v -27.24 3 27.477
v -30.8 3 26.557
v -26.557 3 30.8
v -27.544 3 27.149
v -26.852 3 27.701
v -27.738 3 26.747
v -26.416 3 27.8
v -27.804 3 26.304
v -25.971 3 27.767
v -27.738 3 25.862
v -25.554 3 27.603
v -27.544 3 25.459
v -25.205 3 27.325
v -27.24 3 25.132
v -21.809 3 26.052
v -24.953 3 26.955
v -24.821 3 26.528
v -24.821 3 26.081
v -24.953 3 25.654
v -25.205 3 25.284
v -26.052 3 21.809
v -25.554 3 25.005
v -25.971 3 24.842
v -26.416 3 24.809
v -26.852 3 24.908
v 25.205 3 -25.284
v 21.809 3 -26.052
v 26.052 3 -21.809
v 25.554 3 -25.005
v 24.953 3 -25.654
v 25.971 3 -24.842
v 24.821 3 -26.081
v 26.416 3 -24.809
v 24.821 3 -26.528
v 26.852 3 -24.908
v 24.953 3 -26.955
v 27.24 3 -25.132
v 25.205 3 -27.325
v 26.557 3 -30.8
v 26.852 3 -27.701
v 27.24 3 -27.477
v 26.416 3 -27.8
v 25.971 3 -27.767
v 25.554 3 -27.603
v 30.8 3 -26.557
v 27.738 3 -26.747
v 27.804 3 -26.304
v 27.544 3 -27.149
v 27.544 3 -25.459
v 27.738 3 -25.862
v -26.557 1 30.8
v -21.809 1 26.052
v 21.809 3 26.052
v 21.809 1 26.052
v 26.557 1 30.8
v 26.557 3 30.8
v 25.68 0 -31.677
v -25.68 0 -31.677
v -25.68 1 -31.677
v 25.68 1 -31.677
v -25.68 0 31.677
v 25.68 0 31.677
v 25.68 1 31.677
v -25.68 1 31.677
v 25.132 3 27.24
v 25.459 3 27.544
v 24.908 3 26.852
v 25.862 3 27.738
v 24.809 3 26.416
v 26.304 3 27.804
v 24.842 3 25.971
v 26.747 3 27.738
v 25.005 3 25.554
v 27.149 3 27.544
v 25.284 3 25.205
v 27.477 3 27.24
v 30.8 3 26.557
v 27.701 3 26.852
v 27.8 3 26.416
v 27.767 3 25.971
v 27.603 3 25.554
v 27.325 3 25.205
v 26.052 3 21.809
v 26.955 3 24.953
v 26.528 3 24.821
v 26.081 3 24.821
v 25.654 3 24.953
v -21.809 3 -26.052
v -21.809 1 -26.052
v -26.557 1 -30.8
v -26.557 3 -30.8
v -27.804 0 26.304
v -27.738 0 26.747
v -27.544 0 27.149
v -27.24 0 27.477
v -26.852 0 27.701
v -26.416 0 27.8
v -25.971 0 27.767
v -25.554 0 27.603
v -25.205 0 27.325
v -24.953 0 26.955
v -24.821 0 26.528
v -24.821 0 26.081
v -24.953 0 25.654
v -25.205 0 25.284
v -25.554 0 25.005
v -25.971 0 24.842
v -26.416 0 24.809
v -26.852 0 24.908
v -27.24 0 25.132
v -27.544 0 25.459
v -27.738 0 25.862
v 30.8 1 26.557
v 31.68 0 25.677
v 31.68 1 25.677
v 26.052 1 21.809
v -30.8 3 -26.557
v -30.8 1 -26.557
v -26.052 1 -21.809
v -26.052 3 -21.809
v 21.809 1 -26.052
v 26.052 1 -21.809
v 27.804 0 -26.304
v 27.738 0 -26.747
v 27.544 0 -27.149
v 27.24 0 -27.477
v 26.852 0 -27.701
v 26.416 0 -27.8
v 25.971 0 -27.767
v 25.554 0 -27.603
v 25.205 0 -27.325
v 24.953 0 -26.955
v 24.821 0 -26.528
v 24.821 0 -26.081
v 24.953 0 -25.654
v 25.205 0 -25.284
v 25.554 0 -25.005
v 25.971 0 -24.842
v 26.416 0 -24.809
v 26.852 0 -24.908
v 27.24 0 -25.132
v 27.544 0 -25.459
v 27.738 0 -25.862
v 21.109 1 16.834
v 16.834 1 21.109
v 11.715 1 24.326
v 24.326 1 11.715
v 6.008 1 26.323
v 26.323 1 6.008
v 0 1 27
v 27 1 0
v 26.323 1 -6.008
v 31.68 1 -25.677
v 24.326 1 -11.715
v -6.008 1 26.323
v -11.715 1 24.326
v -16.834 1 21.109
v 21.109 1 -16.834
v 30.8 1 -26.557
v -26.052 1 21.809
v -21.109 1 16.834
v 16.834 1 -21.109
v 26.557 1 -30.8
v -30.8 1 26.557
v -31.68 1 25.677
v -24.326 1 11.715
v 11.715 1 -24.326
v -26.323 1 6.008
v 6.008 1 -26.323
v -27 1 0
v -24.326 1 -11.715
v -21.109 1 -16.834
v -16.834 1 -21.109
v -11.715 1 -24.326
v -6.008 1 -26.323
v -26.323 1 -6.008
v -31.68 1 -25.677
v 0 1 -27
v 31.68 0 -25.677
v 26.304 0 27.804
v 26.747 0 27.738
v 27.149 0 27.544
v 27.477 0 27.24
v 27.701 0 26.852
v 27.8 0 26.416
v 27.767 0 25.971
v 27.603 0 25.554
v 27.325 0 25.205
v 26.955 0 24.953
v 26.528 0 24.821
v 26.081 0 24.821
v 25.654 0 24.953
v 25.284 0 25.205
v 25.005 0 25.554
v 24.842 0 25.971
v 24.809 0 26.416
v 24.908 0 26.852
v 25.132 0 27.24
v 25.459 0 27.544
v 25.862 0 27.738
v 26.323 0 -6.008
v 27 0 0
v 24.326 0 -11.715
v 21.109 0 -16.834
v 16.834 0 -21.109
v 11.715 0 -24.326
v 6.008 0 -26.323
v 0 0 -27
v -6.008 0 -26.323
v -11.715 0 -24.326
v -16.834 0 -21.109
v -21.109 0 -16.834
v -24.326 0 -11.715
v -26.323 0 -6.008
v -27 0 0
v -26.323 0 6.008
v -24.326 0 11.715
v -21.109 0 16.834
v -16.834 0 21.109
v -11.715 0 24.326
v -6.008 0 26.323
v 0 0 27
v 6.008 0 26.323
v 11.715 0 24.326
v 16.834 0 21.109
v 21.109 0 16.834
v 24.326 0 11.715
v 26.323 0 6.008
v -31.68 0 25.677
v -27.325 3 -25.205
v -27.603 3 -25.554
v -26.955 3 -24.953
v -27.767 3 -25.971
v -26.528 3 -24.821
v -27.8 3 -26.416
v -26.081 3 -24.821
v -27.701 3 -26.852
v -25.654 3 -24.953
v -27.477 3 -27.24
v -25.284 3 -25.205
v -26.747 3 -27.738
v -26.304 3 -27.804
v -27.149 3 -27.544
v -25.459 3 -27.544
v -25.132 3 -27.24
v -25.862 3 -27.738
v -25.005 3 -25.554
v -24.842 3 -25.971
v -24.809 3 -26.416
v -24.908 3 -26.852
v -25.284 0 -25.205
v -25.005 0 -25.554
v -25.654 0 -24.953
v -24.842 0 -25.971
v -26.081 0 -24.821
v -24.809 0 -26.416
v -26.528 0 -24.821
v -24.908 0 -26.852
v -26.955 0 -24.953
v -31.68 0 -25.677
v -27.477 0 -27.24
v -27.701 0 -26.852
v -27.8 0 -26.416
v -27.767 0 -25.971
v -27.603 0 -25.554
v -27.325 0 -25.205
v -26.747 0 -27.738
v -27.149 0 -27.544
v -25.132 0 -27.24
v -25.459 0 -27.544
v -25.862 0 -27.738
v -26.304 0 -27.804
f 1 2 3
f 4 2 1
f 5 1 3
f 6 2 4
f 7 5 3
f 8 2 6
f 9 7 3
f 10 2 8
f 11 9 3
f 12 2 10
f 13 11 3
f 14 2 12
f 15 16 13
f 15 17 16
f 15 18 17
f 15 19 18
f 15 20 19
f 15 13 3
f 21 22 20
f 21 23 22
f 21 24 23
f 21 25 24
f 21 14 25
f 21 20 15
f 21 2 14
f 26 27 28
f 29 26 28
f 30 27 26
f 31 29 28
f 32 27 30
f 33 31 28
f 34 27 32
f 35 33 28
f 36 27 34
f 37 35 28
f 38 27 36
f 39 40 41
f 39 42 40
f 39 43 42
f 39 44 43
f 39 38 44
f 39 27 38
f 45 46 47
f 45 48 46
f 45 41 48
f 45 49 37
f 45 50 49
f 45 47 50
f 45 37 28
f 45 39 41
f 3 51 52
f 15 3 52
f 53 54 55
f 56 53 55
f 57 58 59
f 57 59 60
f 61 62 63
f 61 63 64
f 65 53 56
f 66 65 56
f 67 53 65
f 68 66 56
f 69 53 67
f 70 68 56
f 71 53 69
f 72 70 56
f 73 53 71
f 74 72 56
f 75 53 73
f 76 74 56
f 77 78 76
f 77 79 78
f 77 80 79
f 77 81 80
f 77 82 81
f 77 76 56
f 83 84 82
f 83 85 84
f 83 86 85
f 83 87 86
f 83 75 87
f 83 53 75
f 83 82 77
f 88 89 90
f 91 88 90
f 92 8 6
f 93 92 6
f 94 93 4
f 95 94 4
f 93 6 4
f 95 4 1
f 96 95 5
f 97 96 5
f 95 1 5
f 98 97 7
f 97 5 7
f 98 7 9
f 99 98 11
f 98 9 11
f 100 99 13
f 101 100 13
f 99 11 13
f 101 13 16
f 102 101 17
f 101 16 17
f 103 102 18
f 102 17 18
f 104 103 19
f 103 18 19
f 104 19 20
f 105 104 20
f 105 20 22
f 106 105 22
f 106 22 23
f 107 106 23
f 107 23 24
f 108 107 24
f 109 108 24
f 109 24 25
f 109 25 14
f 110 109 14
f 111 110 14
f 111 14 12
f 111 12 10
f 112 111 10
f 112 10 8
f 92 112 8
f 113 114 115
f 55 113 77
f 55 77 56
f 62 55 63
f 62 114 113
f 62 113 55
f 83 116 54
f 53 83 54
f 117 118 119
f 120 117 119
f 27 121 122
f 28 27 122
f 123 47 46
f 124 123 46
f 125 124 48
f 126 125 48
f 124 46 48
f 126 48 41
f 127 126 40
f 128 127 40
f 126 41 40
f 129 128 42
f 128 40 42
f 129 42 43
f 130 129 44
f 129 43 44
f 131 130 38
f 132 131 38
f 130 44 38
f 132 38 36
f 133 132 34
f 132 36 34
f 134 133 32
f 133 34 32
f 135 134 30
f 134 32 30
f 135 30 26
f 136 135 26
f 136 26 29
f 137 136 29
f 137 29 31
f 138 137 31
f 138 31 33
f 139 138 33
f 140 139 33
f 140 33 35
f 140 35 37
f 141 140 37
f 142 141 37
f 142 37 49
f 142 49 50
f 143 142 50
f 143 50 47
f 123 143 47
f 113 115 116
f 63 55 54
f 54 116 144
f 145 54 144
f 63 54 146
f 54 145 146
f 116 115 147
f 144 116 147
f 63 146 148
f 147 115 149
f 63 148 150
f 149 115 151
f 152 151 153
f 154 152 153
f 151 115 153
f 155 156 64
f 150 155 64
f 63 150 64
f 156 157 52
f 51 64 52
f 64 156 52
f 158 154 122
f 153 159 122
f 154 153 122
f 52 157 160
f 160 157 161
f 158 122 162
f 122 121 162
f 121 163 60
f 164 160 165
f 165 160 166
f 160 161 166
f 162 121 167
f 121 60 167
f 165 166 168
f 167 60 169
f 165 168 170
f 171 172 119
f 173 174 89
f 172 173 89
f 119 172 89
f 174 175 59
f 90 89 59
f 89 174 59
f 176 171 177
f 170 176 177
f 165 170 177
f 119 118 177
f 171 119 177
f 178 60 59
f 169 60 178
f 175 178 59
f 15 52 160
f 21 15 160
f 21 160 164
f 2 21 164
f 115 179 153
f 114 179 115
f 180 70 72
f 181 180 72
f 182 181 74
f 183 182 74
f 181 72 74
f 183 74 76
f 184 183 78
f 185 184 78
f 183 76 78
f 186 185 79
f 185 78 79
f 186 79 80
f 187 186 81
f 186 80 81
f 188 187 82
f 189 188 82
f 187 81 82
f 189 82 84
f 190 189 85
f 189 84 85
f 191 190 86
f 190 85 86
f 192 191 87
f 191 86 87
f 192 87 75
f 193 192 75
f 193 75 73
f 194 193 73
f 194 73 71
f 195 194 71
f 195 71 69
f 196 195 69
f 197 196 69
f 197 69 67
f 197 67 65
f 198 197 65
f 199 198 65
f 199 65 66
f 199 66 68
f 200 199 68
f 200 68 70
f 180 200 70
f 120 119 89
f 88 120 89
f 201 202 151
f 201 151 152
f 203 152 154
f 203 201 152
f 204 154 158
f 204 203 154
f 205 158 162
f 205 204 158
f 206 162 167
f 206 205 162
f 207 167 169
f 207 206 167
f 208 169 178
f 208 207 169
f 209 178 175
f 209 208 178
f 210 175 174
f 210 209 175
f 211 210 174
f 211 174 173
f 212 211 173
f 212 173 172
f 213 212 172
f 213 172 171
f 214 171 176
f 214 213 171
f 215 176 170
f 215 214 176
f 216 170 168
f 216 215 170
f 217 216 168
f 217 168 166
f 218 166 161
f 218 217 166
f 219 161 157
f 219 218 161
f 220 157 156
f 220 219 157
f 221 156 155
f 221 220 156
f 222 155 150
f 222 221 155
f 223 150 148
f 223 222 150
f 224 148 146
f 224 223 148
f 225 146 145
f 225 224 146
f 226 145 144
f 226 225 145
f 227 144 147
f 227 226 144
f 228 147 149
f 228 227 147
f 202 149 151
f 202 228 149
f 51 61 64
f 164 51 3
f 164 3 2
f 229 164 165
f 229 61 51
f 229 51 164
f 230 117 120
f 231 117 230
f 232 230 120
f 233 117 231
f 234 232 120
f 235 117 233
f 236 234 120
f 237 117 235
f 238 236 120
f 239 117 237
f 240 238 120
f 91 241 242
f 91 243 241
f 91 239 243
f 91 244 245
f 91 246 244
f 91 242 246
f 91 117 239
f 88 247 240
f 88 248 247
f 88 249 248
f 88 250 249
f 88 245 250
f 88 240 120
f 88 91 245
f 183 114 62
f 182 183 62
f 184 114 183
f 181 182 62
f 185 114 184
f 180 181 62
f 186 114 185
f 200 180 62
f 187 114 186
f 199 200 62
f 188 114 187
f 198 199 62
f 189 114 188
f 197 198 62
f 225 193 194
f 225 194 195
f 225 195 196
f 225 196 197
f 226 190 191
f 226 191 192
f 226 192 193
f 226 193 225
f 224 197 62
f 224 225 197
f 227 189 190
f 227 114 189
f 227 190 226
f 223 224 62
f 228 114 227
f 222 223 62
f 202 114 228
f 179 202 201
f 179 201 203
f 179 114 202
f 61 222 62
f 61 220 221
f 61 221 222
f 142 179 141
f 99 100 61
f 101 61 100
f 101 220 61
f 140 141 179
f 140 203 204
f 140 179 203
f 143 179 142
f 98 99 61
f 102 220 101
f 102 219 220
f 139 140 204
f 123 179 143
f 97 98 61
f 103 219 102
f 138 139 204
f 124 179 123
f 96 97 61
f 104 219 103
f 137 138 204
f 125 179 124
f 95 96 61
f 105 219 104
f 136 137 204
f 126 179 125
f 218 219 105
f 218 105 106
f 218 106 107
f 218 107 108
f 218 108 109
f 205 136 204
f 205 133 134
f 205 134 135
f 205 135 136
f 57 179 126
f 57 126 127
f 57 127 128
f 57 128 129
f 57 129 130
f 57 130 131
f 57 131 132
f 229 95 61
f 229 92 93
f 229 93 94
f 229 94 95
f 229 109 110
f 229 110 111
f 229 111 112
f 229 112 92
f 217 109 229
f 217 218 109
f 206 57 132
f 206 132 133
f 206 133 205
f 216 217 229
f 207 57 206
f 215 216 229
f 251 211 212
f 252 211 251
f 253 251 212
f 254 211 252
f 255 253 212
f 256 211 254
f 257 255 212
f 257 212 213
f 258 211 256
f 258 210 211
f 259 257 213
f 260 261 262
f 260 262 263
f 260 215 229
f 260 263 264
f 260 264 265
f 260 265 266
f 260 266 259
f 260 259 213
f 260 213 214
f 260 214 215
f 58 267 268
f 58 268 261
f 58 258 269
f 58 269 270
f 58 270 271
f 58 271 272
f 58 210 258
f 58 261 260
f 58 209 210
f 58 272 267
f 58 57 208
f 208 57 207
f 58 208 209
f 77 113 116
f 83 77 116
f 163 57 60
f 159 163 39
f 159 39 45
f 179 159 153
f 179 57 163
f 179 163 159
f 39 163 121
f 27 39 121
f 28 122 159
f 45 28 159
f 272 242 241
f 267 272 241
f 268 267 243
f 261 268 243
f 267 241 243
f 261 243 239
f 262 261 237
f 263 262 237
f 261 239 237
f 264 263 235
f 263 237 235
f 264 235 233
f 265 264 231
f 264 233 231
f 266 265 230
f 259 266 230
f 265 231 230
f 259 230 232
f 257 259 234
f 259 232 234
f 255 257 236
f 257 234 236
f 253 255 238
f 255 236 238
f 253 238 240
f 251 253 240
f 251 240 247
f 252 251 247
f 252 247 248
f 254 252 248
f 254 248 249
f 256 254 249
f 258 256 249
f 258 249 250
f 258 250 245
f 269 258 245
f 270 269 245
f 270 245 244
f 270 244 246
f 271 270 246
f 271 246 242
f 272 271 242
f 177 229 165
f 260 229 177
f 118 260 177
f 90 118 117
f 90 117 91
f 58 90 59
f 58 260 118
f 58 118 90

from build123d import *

# Parameters (mm, degrees)
SKETCH1_R           = 27
BOSS_EXTRUDE1_DEPTH = 1
BOSS_EXTRUDE3_DEPTH = 2
SKETCH14_R          = 1.5
CUT_EXTRUDE2_DEPTH  = 4
CIRPATTERN2_COUNT   = 4


with BuildPart() as part:
    # Sketch1 → Boss-Extrude1 (new body)
    with BuildSketch(Plane(origin=(0, 0, 0), x_dir=(1, 0, 0), z_dir=(0, 1, 0))):
        Polygon((-31.68, 25.676767512), (-25.68, 31.676767512), (25.68, 31.676767512), (31.68, 25.676767512), (31.68, -25.676767512), (25.68, -31.676767512), (-25.68, -31.676767512), (-31.68, -25.676767512), align=None)
        Circle(SKETCH1_R, mode=Mode.SUBTRACT)
    extrude(amount=BOSS_EXTRUDE1_DEPTH)

    # Sketch2 → Boss-Extrude3 (add)
    with BuildSketch(Plane(origin=(0, 1, 0), x_dir=(1, 0, 0), z_dir=(0, 1, 0))):
        Polygon((26.557063412, 30.799704099), (21.809040421, 26.051681108), (26.051681108, 21.809040421), (30.799704099, 26.557063412), align=None)
        Polygon((30.799704099, -26.557063412), (26.051681108, -21.809040421), (21.809040421, -26.051681108), (26.557063412, -30.799704099), align=None)
        Polygon((-26.557063412, -30.799704099), (-21.809040421, -26.051681108), (-26.051681108, -21.809040421), (-30.799704099, -26.557063412), align=None)
        Polygon((-30.799704099, 26.557063412), (-26.051681108, 21.809040421), (-21.809040421, 26.051681108), (-26.557063412, 30.799704099), align=None)
    extrude(amount=BOSS_EXTRUDE3_DEPTH)

    # Sketch14 → Cut-Extrude2 (cut, through all)
    with BuildSketch(Plane(origin=(0, 3, 0), x_dir=(1, 0, 0), z_dir=(0, 1, 0))):
        with Locations((26.30437226, 26.30437226)):
            Circle(SKETCH14_R)
    cut_extrude2 = extrude(amount=-CUT_EXTRUDE2_DEPTH, mode=Mode.SUBTRACT)

    # CirPattern2: Cut-Extrude2 ×4 about axis
    cirpattern2_axis = Axis((0, 0, 0), (0, 1, 0))
    for i in range(1, CIRPATTERN2_COUNT):
        add(cut_extrude2.rotate(cirpattern2_axis, i * 360 / CIRPATTERN2_COUNT), mode=Mode.SUBTRACT)


solid = part.part
